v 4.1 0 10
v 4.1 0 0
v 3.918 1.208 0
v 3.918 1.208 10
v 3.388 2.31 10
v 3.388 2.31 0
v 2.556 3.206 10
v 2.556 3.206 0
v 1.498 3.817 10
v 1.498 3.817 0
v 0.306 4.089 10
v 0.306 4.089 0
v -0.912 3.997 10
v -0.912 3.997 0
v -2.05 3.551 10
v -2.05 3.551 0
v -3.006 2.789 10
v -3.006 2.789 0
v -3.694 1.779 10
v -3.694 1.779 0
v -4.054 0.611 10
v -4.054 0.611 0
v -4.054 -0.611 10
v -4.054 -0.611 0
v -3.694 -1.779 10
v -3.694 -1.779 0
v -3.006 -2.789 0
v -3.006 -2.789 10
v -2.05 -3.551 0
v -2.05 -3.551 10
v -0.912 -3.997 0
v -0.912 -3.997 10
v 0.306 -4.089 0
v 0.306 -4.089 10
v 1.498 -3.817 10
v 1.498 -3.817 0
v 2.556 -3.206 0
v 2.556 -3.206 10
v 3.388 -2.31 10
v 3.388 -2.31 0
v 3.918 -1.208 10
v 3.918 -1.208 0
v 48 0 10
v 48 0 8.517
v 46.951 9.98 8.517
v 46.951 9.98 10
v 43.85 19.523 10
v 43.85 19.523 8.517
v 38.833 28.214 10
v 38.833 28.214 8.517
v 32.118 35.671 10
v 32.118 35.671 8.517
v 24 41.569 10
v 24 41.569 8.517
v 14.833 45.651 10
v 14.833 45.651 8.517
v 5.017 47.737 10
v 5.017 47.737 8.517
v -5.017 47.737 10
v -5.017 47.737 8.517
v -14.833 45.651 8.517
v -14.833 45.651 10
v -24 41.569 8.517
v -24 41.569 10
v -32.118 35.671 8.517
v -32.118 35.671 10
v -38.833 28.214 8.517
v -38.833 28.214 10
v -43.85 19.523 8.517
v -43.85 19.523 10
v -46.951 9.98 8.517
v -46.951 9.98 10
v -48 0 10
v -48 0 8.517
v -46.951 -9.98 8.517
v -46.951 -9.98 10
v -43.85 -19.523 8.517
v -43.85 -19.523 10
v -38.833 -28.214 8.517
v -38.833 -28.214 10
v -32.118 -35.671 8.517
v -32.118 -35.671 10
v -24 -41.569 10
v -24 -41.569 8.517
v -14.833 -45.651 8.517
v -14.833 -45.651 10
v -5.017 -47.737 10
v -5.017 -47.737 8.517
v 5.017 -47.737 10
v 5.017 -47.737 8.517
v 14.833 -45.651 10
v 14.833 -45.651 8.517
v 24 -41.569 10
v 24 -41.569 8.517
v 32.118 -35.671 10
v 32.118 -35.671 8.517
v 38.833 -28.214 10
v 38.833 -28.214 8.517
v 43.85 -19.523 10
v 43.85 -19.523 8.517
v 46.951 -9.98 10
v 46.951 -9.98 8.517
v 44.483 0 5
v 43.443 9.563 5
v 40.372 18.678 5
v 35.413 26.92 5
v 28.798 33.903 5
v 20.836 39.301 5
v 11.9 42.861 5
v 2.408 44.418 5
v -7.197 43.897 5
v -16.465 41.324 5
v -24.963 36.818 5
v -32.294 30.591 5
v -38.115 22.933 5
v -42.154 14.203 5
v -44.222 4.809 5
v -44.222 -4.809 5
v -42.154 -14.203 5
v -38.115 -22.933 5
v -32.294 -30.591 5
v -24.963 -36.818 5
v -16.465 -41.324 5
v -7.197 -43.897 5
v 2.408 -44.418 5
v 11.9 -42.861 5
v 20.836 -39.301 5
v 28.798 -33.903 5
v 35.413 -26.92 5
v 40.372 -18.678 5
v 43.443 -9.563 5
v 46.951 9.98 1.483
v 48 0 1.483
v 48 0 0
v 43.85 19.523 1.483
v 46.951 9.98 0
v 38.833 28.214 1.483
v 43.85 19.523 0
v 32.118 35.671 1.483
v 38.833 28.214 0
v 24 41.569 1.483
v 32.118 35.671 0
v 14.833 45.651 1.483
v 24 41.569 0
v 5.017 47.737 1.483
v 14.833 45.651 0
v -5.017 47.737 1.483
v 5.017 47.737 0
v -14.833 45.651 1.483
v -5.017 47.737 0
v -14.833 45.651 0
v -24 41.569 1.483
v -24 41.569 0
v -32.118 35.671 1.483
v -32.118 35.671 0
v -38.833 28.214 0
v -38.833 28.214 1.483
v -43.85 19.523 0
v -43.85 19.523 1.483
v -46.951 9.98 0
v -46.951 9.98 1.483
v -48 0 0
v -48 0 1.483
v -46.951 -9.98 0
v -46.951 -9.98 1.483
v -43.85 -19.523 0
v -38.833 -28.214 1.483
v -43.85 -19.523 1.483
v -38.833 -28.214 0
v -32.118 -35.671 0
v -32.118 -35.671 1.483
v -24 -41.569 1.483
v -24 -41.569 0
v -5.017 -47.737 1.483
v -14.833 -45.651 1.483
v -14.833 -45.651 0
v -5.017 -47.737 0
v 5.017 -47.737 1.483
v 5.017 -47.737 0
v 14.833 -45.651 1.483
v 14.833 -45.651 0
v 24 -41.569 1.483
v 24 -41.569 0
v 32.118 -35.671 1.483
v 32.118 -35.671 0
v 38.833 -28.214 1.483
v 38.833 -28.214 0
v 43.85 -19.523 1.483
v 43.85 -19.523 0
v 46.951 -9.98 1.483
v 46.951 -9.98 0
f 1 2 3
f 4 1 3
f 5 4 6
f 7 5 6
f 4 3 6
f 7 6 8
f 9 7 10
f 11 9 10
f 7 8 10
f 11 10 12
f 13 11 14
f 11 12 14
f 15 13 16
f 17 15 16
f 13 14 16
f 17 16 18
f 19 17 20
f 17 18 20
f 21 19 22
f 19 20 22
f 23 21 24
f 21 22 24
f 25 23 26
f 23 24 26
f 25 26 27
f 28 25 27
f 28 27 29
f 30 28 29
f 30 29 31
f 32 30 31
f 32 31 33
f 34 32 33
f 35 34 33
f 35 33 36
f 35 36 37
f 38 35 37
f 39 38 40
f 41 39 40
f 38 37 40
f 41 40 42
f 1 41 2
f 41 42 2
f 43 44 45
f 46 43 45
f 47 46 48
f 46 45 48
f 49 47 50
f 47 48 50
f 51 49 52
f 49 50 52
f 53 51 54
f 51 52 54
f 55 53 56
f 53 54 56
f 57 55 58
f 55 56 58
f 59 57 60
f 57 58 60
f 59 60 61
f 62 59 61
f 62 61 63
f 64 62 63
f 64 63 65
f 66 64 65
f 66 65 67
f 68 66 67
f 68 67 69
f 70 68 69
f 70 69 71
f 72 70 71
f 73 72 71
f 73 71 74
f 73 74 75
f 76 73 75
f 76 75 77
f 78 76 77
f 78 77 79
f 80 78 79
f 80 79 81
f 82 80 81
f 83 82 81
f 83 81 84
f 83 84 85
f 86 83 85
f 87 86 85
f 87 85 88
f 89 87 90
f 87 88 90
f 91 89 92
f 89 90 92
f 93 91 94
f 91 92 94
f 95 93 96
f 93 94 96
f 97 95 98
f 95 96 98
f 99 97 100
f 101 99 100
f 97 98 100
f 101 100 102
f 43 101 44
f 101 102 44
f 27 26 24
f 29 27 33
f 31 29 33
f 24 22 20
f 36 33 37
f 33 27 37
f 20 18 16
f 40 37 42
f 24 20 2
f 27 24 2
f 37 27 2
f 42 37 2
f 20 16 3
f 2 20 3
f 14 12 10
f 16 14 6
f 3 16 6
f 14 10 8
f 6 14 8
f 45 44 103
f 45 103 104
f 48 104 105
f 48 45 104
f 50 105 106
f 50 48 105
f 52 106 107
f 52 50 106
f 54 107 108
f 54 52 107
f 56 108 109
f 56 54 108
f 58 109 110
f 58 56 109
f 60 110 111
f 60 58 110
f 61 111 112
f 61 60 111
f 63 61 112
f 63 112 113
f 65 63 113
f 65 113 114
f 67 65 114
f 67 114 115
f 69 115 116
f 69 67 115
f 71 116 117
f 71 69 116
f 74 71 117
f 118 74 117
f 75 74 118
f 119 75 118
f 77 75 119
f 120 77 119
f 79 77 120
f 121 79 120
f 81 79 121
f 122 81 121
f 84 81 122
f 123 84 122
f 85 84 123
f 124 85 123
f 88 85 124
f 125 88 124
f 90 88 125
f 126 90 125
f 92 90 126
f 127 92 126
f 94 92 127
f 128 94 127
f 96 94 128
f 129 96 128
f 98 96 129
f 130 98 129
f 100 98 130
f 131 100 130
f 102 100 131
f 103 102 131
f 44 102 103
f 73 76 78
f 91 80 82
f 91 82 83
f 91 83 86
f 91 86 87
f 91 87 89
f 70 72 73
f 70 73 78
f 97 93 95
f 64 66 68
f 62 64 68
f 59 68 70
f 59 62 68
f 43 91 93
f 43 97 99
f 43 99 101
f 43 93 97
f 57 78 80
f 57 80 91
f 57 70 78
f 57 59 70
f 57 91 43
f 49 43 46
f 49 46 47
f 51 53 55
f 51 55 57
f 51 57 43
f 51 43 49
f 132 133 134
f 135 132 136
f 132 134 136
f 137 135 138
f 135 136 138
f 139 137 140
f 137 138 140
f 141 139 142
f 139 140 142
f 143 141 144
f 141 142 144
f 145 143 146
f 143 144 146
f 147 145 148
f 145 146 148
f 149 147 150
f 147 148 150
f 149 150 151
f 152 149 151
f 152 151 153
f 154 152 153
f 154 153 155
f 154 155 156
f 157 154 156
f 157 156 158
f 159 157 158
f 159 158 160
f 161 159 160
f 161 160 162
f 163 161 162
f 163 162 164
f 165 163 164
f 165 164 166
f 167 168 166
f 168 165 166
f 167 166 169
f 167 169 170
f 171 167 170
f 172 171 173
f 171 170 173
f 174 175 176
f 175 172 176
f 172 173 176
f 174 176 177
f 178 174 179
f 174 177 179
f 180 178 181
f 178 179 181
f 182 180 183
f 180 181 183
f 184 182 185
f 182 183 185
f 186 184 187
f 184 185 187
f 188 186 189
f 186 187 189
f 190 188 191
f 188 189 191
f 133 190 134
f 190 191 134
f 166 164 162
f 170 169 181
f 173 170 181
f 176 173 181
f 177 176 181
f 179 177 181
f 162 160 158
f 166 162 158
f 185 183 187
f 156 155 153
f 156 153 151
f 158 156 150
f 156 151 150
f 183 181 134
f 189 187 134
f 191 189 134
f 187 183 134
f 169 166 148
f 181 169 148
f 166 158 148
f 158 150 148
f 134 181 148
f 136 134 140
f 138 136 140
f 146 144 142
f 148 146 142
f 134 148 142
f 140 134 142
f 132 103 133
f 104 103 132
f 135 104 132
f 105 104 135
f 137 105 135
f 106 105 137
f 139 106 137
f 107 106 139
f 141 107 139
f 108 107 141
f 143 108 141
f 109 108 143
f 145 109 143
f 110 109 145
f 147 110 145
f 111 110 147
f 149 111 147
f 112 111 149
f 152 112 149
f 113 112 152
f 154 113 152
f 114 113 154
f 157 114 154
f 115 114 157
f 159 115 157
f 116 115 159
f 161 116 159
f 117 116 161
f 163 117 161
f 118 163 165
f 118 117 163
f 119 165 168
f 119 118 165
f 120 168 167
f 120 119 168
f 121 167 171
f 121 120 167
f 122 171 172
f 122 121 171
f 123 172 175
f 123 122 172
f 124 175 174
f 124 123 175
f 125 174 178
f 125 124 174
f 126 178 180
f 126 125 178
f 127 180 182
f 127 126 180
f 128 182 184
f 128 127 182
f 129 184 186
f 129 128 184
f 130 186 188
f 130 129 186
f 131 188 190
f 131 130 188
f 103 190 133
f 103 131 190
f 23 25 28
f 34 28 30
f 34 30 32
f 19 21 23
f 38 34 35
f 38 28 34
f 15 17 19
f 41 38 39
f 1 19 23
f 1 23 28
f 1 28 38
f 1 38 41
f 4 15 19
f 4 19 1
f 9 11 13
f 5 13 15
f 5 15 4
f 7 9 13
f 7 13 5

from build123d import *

# Parameters (mm, degrees)
CYLINDER001_R     = 4.1
CYLINDER001_DEPTH = 10
CYLINDER_R        = 48
CYLINDER_DEPTH    = 10


with BuildPart() as cylinder001:
    # Cylinder001 → Cylinder001 (new body)
    with BuildSketch(Plane.XY):
        Circle(CYLINDER001_R)
    extrude(amount=CYLINDER001_DEPTH)


with BuildPart() as revolution:
    # Sketch → Revolution (revolve)
    with BuildSketch(Plane.XZ):
        Polygon((44.482881, 5), (49.482881, 10), (49.482881, 0), align=None)
    revolve(axis=Axis((0, 0, 0), (0, 0, 1)))


with BuildPart() as cut:
    # Cylinder → Cylinder (new body)
    with BuildSketch(Plane.XY):
        Circle(CYLINDER_R)
    extrude(amount=CYLINDER_DEPTH)

    # Cut: cut Revolution
    add(revolution.part, mode=Mode.SUBTRACT)


solid = Compound([cylinder001.part, cut.part])
